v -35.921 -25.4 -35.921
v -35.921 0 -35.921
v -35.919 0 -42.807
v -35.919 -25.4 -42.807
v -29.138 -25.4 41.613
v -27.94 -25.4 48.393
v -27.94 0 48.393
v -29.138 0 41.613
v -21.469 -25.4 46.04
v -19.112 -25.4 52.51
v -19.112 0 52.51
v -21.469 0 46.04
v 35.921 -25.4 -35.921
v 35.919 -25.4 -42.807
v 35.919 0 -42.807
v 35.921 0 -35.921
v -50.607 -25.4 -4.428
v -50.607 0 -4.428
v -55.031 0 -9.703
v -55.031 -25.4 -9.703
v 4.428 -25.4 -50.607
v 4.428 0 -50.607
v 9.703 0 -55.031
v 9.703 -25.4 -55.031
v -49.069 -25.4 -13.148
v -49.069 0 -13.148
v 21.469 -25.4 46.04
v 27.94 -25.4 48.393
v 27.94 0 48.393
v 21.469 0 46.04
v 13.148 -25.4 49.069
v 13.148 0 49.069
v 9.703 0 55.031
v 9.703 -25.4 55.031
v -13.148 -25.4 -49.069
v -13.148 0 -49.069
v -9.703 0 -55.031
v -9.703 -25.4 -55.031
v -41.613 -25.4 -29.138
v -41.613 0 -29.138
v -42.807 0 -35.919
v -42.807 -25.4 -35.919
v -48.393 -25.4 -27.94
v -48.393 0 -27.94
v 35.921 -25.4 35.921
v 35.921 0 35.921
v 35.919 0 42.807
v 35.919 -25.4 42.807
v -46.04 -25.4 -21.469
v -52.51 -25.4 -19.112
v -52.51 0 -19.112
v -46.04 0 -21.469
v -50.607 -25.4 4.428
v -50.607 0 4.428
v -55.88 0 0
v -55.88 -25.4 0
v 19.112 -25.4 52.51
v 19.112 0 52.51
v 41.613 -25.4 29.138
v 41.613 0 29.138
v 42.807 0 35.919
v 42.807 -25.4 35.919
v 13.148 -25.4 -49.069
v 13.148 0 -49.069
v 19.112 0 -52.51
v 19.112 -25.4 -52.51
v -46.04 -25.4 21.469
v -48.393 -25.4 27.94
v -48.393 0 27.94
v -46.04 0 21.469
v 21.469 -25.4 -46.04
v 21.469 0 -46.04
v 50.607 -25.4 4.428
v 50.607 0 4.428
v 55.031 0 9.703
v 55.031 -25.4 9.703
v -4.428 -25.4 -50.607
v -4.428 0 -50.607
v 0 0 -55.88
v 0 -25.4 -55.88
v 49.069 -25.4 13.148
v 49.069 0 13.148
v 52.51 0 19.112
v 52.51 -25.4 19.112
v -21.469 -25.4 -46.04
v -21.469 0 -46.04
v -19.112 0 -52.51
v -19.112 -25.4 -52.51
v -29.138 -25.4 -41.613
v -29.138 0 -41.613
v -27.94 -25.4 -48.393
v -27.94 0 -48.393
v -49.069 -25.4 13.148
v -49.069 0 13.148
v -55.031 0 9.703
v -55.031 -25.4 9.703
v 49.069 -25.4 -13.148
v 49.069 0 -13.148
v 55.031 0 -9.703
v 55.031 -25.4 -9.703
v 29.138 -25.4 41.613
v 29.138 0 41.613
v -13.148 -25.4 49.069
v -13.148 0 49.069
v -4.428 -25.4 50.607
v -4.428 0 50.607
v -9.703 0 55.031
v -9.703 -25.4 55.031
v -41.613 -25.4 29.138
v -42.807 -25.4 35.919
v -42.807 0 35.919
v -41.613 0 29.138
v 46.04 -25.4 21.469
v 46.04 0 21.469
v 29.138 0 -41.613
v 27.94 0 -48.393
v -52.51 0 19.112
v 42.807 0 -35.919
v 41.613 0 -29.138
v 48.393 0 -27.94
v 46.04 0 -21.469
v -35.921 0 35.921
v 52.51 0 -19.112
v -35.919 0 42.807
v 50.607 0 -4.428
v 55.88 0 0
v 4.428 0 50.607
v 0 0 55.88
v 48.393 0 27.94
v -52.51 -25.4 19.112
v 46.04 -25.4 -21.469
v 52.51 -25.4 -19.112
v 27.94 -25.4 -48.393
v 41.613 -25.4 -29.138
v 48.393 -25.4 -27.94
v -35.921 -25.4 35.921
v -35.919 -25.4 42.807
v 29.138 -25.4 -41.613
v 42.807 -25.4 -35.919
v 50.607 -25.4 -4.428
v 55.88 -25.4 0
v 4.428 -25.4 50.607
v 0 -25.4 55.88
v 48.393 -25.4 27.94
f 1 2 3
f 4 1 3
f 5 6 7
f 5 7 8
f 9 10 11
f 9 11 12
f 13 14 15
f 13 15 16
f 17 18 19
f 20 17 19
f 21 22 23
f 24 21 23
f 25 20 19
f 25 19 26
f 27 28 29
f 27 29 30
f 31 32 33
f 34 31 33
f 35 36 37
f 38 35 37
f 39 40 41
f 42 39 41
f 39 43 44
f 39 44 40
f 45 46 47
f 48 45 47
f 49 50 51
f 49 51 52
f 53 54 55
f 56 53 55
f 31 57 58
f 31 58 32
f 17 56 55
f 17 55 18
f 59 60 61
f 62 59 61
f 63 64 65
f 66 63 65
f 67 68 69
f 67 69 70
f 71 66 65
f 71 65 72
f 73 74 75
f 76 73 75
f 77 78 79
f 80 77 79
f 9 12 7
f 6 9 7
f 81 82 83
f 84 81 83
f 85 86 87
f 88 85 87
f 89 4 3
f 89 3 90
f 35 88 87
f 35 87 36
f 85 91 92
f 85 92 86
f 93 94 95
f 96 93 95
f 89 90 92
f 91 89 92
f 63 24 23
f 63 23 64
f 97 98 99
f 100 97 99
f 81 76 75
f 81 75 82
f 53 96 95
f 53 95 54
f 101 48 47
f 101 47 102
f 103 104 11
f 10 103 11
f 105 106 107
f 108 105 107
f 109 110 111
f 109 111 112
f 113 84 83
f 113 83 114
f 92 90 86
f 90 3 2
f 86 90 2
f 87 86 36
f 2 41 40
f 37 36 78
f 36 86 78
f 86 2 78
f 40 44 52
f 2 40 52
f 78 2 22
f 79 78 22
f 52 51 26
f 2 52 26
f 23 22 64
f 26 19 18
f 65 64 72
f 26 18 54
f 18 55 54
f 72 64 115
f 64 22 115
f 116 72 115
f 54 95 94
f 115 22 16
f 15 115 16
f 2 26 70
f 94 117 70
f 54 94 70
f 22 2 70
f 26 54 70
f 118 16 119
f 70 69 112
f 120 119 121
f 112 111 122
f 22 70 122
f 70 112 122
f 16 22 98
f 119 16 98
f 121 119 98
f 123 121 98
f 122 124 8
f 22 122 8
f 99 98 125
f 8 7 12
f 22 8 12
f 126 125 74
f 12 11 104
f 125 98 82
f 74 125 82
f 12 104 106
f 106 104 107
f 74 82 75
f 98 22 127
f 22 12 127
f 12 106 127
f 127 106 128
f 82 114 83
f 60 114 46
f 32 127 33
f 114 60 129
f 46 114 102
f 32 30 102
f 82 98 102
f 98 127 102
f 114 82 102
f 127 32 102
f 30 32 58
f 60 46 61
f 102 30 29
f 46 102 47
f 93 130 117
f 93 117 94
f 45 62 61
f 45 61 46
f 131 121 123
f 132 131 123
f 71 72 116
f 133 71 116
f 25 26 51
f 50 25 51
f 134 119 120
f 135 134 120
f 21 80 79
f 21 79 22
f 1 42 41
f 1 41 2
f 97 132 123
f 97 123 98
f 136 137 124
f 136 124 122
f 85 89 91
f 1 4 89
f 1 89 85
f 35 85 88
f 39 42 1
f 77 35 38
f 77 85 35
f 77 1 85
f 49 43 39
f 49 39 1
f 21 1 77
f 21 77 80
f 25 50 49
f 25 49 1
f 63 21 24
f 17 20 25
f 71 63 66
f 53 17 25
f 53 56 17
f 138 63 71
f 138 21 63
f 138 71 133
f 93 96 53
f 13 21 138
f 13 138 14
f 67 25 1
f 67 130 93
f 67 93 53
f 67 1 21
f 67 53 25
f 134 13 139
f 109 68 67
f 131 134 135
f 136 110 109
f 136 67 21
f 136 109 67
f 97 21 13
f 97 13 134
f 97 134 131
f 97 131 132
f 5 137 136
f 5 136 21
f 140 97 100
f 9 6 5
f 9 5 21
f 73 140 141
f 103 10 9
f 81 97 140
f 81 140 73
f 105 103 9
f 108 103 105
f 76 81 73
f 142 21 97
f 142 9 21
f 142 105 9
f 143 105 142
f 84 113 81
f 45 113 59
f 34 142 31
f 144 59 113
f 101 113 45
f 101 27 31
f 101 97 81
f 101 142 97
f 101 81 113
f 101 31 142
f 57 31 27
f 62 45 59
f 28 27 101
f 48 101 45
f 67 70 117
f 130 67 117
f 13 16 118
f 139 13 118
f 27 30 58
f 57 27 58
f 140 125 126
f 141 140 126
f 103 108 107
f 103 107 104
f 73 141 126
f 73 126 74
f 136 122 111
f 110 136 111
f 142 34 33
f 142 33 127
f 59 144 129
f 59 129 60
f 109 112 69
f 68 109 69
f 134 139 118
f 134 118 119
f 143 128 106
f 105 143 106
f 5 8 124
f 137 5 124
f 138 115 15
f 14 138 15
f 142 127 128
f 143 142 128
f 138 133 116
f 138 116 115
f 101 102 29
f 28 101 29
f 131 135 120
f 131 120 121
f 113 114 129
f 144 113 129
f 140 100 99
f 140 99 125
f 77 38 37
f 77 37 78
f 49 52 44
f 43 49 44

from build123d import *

# Parameters (mm, degrees)
F0_R            = 50.8
F1_DEPTH        = 25.4
F3_DEPTH        = 25.4
F3_COPIES_COUNT = 36


# Not quite as in the source:
# - a pattern or mirror of a feature is missing from the dataset's text; its kind, count and spacing are read off the source's solid


with BuildPart() as f1:
    # F0 (on Front) → F1 (new body)
    with BuildSketch(Plane.XZ):
        Circle(F0_R)
    extrude(amount=F1_DEPTH)

    # F2 (on Front) → F3 (join, through all)
    with BuildSketch(Plane.XZ):
        Polygon((4.4275117316, 50.6066906631), (0, 55.88), (-4.4275117316, 50.6066906631), align=None)
    f3 = extrude(amount=F3_DEPTH)

    # F3_copies: F3 ×36 about axis
    f3_copies_axis = Axis((0, 0, 0), (0, 1, 0))
    for i in range(1, F3_COPIES_COUNT):
        add(f3.rotate(f3_copies_axis, i * 360 / F3_COPIES_COUNT))


solid = f1.part
